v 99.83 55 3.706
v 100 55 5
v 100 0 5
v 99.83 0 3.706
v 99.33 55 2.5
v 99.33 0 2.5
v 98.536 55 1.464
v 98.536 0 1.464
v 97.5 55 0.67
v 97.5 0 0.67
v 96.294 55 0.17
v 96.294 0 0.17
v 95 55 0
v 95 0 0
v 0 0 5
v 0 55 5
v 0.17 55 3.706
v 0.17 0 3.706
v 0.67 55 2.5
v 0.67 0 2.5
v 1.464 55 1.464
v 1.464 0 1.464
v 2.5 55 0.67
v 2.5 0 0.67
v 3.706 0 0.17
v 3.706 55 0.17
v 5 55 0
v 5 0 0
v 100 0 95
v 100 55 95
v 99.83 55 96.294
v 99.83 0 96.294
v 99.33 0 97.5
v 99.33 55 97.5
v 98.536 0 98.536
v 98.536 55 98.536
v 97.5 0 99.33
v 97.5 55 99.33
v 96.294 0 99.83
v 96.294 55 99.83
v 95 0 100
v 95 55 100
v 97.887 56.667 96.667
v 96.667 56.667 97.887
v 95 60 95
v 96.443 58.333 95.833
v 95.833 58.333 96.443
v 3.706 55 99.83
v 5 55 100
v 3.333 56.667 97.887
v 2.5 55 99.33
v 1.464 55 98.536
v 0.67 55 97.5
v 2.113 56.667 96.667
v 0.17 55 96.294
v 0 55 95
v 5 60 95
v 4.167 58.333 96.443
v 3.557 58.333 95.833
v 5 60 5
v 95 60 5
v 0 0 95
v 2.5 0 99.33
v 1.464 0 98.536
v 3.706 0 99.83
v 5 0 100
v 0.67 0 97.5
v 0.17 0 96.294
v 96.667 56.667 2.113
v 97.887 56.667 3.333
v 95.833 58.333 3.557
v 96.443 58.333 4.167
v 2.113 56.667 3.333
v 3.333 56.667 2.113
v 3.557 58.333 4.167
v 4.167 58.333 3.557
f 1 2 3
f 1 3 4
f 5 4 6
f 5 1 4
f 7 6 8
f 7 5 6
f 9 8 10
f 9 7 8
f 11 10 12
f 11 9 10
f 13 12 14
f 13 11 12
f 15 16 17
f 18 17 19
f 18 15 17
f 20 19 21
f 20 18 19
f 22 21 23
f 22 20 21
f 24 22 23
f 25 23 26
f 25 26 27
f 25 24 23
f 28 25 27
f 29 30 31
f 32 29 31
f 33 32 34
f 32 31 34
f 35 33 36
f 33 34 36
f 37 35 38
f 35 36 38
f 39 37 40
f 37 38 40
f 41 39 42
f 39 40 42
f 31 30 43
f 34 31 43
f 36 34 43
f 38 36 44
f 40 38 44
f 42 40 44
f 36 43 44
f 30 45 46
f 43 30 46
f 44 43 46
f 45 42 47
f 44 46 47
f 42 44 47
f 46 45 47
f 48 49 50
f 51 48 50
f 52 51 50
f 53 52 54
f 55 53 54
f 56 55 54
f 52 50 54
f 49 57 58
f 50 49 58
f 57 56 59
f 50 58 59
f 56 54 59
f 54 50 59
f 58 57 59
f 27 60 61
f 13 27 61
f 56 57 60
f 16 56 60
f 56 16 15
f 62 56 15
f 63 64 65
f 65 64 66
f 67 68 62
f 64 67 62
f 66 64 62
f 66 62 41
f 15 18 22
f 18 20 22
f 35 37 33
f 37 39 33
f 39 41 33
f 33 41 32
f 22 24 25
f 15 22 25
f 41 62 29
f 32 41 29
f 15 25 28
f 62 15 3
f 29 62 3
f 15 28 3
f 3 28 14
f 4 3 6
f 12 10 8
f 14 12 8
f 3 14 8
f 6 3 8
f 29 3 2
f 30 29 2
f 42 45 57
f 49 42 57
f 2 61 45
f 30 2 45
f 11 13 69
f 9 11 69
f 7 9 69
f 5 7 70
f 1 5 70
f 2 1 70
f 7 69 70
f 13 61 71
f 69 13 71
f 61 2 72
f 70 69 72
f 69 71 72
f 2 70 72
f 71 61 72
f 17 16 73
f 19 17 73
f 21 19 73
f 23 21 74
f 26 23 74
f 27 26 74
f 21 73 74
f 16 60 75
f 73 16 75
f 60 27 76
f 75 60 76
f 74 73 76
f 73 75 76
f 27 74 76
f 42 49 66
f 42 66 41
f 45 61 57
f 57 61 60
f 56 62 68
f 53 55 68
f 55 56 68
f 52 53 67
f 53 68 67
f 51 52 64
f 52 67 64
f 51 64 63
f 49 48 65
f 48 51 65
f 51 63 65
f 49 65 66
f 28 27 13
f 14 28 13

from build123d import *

# Parameters (mm, degrees)
DODANIE_WYCI_GNI_CIE1_DEPTH = 100
ZAOKR_GLENIE3_R             = 5
SFAZOWANIE1_SIZE            = 5


with BuildPart() as part:
    # Szkic 3D1 → Dodanie-wyciągnięcie1 (new body)
    with BuildSketch(Plane(origin=(0, 0, 0), x_dir=(0.8574929257125442, 0.5144957554275265, 0), z_dir=(0, 0, 1))):
        Polygon((0, 0), (85.749292571, -51.449575543), (116.619037897, 0), (30.869745326, 51.449575543), align=None)
    extrude(amount=DODANIE_WYCI_GNI_CIE1_DEPTH)

    # Zaokrąglenie3
    zaokr_glenie3_edges = [part.edges().sort_by_distance(p)[0] for p in [
        (0, 30, 100),
        (0, 30, 0),
        (100, 30, 0),
        (100, 30, 100),
    ]]
    fillet(zaokr_glenie3_edges, radius=ZAOKR_GLENIE3_R)

    # Sfazowanie1
    sfazowanie1_edges = [part.edges().sort_by_distance(p)[0] for p in [
        (50, 60, 100),
        (0, 60, 50),
        (100, 60, 50),
        (50, 60, 0),
        (98.535533906, 60, 98.535533906),
        (98.535533906, 60, 1.464466094),
        (1.464466094, 60, 1.464466094),
        (1.464466094, 60, 98.535533906),
    ]]
    chamfer(sfazowanie1_edges, length=SFAZOWANIE1_SIZE - 0.0001)  # a hair under: the kernel refuses the full size


solid = part.part
